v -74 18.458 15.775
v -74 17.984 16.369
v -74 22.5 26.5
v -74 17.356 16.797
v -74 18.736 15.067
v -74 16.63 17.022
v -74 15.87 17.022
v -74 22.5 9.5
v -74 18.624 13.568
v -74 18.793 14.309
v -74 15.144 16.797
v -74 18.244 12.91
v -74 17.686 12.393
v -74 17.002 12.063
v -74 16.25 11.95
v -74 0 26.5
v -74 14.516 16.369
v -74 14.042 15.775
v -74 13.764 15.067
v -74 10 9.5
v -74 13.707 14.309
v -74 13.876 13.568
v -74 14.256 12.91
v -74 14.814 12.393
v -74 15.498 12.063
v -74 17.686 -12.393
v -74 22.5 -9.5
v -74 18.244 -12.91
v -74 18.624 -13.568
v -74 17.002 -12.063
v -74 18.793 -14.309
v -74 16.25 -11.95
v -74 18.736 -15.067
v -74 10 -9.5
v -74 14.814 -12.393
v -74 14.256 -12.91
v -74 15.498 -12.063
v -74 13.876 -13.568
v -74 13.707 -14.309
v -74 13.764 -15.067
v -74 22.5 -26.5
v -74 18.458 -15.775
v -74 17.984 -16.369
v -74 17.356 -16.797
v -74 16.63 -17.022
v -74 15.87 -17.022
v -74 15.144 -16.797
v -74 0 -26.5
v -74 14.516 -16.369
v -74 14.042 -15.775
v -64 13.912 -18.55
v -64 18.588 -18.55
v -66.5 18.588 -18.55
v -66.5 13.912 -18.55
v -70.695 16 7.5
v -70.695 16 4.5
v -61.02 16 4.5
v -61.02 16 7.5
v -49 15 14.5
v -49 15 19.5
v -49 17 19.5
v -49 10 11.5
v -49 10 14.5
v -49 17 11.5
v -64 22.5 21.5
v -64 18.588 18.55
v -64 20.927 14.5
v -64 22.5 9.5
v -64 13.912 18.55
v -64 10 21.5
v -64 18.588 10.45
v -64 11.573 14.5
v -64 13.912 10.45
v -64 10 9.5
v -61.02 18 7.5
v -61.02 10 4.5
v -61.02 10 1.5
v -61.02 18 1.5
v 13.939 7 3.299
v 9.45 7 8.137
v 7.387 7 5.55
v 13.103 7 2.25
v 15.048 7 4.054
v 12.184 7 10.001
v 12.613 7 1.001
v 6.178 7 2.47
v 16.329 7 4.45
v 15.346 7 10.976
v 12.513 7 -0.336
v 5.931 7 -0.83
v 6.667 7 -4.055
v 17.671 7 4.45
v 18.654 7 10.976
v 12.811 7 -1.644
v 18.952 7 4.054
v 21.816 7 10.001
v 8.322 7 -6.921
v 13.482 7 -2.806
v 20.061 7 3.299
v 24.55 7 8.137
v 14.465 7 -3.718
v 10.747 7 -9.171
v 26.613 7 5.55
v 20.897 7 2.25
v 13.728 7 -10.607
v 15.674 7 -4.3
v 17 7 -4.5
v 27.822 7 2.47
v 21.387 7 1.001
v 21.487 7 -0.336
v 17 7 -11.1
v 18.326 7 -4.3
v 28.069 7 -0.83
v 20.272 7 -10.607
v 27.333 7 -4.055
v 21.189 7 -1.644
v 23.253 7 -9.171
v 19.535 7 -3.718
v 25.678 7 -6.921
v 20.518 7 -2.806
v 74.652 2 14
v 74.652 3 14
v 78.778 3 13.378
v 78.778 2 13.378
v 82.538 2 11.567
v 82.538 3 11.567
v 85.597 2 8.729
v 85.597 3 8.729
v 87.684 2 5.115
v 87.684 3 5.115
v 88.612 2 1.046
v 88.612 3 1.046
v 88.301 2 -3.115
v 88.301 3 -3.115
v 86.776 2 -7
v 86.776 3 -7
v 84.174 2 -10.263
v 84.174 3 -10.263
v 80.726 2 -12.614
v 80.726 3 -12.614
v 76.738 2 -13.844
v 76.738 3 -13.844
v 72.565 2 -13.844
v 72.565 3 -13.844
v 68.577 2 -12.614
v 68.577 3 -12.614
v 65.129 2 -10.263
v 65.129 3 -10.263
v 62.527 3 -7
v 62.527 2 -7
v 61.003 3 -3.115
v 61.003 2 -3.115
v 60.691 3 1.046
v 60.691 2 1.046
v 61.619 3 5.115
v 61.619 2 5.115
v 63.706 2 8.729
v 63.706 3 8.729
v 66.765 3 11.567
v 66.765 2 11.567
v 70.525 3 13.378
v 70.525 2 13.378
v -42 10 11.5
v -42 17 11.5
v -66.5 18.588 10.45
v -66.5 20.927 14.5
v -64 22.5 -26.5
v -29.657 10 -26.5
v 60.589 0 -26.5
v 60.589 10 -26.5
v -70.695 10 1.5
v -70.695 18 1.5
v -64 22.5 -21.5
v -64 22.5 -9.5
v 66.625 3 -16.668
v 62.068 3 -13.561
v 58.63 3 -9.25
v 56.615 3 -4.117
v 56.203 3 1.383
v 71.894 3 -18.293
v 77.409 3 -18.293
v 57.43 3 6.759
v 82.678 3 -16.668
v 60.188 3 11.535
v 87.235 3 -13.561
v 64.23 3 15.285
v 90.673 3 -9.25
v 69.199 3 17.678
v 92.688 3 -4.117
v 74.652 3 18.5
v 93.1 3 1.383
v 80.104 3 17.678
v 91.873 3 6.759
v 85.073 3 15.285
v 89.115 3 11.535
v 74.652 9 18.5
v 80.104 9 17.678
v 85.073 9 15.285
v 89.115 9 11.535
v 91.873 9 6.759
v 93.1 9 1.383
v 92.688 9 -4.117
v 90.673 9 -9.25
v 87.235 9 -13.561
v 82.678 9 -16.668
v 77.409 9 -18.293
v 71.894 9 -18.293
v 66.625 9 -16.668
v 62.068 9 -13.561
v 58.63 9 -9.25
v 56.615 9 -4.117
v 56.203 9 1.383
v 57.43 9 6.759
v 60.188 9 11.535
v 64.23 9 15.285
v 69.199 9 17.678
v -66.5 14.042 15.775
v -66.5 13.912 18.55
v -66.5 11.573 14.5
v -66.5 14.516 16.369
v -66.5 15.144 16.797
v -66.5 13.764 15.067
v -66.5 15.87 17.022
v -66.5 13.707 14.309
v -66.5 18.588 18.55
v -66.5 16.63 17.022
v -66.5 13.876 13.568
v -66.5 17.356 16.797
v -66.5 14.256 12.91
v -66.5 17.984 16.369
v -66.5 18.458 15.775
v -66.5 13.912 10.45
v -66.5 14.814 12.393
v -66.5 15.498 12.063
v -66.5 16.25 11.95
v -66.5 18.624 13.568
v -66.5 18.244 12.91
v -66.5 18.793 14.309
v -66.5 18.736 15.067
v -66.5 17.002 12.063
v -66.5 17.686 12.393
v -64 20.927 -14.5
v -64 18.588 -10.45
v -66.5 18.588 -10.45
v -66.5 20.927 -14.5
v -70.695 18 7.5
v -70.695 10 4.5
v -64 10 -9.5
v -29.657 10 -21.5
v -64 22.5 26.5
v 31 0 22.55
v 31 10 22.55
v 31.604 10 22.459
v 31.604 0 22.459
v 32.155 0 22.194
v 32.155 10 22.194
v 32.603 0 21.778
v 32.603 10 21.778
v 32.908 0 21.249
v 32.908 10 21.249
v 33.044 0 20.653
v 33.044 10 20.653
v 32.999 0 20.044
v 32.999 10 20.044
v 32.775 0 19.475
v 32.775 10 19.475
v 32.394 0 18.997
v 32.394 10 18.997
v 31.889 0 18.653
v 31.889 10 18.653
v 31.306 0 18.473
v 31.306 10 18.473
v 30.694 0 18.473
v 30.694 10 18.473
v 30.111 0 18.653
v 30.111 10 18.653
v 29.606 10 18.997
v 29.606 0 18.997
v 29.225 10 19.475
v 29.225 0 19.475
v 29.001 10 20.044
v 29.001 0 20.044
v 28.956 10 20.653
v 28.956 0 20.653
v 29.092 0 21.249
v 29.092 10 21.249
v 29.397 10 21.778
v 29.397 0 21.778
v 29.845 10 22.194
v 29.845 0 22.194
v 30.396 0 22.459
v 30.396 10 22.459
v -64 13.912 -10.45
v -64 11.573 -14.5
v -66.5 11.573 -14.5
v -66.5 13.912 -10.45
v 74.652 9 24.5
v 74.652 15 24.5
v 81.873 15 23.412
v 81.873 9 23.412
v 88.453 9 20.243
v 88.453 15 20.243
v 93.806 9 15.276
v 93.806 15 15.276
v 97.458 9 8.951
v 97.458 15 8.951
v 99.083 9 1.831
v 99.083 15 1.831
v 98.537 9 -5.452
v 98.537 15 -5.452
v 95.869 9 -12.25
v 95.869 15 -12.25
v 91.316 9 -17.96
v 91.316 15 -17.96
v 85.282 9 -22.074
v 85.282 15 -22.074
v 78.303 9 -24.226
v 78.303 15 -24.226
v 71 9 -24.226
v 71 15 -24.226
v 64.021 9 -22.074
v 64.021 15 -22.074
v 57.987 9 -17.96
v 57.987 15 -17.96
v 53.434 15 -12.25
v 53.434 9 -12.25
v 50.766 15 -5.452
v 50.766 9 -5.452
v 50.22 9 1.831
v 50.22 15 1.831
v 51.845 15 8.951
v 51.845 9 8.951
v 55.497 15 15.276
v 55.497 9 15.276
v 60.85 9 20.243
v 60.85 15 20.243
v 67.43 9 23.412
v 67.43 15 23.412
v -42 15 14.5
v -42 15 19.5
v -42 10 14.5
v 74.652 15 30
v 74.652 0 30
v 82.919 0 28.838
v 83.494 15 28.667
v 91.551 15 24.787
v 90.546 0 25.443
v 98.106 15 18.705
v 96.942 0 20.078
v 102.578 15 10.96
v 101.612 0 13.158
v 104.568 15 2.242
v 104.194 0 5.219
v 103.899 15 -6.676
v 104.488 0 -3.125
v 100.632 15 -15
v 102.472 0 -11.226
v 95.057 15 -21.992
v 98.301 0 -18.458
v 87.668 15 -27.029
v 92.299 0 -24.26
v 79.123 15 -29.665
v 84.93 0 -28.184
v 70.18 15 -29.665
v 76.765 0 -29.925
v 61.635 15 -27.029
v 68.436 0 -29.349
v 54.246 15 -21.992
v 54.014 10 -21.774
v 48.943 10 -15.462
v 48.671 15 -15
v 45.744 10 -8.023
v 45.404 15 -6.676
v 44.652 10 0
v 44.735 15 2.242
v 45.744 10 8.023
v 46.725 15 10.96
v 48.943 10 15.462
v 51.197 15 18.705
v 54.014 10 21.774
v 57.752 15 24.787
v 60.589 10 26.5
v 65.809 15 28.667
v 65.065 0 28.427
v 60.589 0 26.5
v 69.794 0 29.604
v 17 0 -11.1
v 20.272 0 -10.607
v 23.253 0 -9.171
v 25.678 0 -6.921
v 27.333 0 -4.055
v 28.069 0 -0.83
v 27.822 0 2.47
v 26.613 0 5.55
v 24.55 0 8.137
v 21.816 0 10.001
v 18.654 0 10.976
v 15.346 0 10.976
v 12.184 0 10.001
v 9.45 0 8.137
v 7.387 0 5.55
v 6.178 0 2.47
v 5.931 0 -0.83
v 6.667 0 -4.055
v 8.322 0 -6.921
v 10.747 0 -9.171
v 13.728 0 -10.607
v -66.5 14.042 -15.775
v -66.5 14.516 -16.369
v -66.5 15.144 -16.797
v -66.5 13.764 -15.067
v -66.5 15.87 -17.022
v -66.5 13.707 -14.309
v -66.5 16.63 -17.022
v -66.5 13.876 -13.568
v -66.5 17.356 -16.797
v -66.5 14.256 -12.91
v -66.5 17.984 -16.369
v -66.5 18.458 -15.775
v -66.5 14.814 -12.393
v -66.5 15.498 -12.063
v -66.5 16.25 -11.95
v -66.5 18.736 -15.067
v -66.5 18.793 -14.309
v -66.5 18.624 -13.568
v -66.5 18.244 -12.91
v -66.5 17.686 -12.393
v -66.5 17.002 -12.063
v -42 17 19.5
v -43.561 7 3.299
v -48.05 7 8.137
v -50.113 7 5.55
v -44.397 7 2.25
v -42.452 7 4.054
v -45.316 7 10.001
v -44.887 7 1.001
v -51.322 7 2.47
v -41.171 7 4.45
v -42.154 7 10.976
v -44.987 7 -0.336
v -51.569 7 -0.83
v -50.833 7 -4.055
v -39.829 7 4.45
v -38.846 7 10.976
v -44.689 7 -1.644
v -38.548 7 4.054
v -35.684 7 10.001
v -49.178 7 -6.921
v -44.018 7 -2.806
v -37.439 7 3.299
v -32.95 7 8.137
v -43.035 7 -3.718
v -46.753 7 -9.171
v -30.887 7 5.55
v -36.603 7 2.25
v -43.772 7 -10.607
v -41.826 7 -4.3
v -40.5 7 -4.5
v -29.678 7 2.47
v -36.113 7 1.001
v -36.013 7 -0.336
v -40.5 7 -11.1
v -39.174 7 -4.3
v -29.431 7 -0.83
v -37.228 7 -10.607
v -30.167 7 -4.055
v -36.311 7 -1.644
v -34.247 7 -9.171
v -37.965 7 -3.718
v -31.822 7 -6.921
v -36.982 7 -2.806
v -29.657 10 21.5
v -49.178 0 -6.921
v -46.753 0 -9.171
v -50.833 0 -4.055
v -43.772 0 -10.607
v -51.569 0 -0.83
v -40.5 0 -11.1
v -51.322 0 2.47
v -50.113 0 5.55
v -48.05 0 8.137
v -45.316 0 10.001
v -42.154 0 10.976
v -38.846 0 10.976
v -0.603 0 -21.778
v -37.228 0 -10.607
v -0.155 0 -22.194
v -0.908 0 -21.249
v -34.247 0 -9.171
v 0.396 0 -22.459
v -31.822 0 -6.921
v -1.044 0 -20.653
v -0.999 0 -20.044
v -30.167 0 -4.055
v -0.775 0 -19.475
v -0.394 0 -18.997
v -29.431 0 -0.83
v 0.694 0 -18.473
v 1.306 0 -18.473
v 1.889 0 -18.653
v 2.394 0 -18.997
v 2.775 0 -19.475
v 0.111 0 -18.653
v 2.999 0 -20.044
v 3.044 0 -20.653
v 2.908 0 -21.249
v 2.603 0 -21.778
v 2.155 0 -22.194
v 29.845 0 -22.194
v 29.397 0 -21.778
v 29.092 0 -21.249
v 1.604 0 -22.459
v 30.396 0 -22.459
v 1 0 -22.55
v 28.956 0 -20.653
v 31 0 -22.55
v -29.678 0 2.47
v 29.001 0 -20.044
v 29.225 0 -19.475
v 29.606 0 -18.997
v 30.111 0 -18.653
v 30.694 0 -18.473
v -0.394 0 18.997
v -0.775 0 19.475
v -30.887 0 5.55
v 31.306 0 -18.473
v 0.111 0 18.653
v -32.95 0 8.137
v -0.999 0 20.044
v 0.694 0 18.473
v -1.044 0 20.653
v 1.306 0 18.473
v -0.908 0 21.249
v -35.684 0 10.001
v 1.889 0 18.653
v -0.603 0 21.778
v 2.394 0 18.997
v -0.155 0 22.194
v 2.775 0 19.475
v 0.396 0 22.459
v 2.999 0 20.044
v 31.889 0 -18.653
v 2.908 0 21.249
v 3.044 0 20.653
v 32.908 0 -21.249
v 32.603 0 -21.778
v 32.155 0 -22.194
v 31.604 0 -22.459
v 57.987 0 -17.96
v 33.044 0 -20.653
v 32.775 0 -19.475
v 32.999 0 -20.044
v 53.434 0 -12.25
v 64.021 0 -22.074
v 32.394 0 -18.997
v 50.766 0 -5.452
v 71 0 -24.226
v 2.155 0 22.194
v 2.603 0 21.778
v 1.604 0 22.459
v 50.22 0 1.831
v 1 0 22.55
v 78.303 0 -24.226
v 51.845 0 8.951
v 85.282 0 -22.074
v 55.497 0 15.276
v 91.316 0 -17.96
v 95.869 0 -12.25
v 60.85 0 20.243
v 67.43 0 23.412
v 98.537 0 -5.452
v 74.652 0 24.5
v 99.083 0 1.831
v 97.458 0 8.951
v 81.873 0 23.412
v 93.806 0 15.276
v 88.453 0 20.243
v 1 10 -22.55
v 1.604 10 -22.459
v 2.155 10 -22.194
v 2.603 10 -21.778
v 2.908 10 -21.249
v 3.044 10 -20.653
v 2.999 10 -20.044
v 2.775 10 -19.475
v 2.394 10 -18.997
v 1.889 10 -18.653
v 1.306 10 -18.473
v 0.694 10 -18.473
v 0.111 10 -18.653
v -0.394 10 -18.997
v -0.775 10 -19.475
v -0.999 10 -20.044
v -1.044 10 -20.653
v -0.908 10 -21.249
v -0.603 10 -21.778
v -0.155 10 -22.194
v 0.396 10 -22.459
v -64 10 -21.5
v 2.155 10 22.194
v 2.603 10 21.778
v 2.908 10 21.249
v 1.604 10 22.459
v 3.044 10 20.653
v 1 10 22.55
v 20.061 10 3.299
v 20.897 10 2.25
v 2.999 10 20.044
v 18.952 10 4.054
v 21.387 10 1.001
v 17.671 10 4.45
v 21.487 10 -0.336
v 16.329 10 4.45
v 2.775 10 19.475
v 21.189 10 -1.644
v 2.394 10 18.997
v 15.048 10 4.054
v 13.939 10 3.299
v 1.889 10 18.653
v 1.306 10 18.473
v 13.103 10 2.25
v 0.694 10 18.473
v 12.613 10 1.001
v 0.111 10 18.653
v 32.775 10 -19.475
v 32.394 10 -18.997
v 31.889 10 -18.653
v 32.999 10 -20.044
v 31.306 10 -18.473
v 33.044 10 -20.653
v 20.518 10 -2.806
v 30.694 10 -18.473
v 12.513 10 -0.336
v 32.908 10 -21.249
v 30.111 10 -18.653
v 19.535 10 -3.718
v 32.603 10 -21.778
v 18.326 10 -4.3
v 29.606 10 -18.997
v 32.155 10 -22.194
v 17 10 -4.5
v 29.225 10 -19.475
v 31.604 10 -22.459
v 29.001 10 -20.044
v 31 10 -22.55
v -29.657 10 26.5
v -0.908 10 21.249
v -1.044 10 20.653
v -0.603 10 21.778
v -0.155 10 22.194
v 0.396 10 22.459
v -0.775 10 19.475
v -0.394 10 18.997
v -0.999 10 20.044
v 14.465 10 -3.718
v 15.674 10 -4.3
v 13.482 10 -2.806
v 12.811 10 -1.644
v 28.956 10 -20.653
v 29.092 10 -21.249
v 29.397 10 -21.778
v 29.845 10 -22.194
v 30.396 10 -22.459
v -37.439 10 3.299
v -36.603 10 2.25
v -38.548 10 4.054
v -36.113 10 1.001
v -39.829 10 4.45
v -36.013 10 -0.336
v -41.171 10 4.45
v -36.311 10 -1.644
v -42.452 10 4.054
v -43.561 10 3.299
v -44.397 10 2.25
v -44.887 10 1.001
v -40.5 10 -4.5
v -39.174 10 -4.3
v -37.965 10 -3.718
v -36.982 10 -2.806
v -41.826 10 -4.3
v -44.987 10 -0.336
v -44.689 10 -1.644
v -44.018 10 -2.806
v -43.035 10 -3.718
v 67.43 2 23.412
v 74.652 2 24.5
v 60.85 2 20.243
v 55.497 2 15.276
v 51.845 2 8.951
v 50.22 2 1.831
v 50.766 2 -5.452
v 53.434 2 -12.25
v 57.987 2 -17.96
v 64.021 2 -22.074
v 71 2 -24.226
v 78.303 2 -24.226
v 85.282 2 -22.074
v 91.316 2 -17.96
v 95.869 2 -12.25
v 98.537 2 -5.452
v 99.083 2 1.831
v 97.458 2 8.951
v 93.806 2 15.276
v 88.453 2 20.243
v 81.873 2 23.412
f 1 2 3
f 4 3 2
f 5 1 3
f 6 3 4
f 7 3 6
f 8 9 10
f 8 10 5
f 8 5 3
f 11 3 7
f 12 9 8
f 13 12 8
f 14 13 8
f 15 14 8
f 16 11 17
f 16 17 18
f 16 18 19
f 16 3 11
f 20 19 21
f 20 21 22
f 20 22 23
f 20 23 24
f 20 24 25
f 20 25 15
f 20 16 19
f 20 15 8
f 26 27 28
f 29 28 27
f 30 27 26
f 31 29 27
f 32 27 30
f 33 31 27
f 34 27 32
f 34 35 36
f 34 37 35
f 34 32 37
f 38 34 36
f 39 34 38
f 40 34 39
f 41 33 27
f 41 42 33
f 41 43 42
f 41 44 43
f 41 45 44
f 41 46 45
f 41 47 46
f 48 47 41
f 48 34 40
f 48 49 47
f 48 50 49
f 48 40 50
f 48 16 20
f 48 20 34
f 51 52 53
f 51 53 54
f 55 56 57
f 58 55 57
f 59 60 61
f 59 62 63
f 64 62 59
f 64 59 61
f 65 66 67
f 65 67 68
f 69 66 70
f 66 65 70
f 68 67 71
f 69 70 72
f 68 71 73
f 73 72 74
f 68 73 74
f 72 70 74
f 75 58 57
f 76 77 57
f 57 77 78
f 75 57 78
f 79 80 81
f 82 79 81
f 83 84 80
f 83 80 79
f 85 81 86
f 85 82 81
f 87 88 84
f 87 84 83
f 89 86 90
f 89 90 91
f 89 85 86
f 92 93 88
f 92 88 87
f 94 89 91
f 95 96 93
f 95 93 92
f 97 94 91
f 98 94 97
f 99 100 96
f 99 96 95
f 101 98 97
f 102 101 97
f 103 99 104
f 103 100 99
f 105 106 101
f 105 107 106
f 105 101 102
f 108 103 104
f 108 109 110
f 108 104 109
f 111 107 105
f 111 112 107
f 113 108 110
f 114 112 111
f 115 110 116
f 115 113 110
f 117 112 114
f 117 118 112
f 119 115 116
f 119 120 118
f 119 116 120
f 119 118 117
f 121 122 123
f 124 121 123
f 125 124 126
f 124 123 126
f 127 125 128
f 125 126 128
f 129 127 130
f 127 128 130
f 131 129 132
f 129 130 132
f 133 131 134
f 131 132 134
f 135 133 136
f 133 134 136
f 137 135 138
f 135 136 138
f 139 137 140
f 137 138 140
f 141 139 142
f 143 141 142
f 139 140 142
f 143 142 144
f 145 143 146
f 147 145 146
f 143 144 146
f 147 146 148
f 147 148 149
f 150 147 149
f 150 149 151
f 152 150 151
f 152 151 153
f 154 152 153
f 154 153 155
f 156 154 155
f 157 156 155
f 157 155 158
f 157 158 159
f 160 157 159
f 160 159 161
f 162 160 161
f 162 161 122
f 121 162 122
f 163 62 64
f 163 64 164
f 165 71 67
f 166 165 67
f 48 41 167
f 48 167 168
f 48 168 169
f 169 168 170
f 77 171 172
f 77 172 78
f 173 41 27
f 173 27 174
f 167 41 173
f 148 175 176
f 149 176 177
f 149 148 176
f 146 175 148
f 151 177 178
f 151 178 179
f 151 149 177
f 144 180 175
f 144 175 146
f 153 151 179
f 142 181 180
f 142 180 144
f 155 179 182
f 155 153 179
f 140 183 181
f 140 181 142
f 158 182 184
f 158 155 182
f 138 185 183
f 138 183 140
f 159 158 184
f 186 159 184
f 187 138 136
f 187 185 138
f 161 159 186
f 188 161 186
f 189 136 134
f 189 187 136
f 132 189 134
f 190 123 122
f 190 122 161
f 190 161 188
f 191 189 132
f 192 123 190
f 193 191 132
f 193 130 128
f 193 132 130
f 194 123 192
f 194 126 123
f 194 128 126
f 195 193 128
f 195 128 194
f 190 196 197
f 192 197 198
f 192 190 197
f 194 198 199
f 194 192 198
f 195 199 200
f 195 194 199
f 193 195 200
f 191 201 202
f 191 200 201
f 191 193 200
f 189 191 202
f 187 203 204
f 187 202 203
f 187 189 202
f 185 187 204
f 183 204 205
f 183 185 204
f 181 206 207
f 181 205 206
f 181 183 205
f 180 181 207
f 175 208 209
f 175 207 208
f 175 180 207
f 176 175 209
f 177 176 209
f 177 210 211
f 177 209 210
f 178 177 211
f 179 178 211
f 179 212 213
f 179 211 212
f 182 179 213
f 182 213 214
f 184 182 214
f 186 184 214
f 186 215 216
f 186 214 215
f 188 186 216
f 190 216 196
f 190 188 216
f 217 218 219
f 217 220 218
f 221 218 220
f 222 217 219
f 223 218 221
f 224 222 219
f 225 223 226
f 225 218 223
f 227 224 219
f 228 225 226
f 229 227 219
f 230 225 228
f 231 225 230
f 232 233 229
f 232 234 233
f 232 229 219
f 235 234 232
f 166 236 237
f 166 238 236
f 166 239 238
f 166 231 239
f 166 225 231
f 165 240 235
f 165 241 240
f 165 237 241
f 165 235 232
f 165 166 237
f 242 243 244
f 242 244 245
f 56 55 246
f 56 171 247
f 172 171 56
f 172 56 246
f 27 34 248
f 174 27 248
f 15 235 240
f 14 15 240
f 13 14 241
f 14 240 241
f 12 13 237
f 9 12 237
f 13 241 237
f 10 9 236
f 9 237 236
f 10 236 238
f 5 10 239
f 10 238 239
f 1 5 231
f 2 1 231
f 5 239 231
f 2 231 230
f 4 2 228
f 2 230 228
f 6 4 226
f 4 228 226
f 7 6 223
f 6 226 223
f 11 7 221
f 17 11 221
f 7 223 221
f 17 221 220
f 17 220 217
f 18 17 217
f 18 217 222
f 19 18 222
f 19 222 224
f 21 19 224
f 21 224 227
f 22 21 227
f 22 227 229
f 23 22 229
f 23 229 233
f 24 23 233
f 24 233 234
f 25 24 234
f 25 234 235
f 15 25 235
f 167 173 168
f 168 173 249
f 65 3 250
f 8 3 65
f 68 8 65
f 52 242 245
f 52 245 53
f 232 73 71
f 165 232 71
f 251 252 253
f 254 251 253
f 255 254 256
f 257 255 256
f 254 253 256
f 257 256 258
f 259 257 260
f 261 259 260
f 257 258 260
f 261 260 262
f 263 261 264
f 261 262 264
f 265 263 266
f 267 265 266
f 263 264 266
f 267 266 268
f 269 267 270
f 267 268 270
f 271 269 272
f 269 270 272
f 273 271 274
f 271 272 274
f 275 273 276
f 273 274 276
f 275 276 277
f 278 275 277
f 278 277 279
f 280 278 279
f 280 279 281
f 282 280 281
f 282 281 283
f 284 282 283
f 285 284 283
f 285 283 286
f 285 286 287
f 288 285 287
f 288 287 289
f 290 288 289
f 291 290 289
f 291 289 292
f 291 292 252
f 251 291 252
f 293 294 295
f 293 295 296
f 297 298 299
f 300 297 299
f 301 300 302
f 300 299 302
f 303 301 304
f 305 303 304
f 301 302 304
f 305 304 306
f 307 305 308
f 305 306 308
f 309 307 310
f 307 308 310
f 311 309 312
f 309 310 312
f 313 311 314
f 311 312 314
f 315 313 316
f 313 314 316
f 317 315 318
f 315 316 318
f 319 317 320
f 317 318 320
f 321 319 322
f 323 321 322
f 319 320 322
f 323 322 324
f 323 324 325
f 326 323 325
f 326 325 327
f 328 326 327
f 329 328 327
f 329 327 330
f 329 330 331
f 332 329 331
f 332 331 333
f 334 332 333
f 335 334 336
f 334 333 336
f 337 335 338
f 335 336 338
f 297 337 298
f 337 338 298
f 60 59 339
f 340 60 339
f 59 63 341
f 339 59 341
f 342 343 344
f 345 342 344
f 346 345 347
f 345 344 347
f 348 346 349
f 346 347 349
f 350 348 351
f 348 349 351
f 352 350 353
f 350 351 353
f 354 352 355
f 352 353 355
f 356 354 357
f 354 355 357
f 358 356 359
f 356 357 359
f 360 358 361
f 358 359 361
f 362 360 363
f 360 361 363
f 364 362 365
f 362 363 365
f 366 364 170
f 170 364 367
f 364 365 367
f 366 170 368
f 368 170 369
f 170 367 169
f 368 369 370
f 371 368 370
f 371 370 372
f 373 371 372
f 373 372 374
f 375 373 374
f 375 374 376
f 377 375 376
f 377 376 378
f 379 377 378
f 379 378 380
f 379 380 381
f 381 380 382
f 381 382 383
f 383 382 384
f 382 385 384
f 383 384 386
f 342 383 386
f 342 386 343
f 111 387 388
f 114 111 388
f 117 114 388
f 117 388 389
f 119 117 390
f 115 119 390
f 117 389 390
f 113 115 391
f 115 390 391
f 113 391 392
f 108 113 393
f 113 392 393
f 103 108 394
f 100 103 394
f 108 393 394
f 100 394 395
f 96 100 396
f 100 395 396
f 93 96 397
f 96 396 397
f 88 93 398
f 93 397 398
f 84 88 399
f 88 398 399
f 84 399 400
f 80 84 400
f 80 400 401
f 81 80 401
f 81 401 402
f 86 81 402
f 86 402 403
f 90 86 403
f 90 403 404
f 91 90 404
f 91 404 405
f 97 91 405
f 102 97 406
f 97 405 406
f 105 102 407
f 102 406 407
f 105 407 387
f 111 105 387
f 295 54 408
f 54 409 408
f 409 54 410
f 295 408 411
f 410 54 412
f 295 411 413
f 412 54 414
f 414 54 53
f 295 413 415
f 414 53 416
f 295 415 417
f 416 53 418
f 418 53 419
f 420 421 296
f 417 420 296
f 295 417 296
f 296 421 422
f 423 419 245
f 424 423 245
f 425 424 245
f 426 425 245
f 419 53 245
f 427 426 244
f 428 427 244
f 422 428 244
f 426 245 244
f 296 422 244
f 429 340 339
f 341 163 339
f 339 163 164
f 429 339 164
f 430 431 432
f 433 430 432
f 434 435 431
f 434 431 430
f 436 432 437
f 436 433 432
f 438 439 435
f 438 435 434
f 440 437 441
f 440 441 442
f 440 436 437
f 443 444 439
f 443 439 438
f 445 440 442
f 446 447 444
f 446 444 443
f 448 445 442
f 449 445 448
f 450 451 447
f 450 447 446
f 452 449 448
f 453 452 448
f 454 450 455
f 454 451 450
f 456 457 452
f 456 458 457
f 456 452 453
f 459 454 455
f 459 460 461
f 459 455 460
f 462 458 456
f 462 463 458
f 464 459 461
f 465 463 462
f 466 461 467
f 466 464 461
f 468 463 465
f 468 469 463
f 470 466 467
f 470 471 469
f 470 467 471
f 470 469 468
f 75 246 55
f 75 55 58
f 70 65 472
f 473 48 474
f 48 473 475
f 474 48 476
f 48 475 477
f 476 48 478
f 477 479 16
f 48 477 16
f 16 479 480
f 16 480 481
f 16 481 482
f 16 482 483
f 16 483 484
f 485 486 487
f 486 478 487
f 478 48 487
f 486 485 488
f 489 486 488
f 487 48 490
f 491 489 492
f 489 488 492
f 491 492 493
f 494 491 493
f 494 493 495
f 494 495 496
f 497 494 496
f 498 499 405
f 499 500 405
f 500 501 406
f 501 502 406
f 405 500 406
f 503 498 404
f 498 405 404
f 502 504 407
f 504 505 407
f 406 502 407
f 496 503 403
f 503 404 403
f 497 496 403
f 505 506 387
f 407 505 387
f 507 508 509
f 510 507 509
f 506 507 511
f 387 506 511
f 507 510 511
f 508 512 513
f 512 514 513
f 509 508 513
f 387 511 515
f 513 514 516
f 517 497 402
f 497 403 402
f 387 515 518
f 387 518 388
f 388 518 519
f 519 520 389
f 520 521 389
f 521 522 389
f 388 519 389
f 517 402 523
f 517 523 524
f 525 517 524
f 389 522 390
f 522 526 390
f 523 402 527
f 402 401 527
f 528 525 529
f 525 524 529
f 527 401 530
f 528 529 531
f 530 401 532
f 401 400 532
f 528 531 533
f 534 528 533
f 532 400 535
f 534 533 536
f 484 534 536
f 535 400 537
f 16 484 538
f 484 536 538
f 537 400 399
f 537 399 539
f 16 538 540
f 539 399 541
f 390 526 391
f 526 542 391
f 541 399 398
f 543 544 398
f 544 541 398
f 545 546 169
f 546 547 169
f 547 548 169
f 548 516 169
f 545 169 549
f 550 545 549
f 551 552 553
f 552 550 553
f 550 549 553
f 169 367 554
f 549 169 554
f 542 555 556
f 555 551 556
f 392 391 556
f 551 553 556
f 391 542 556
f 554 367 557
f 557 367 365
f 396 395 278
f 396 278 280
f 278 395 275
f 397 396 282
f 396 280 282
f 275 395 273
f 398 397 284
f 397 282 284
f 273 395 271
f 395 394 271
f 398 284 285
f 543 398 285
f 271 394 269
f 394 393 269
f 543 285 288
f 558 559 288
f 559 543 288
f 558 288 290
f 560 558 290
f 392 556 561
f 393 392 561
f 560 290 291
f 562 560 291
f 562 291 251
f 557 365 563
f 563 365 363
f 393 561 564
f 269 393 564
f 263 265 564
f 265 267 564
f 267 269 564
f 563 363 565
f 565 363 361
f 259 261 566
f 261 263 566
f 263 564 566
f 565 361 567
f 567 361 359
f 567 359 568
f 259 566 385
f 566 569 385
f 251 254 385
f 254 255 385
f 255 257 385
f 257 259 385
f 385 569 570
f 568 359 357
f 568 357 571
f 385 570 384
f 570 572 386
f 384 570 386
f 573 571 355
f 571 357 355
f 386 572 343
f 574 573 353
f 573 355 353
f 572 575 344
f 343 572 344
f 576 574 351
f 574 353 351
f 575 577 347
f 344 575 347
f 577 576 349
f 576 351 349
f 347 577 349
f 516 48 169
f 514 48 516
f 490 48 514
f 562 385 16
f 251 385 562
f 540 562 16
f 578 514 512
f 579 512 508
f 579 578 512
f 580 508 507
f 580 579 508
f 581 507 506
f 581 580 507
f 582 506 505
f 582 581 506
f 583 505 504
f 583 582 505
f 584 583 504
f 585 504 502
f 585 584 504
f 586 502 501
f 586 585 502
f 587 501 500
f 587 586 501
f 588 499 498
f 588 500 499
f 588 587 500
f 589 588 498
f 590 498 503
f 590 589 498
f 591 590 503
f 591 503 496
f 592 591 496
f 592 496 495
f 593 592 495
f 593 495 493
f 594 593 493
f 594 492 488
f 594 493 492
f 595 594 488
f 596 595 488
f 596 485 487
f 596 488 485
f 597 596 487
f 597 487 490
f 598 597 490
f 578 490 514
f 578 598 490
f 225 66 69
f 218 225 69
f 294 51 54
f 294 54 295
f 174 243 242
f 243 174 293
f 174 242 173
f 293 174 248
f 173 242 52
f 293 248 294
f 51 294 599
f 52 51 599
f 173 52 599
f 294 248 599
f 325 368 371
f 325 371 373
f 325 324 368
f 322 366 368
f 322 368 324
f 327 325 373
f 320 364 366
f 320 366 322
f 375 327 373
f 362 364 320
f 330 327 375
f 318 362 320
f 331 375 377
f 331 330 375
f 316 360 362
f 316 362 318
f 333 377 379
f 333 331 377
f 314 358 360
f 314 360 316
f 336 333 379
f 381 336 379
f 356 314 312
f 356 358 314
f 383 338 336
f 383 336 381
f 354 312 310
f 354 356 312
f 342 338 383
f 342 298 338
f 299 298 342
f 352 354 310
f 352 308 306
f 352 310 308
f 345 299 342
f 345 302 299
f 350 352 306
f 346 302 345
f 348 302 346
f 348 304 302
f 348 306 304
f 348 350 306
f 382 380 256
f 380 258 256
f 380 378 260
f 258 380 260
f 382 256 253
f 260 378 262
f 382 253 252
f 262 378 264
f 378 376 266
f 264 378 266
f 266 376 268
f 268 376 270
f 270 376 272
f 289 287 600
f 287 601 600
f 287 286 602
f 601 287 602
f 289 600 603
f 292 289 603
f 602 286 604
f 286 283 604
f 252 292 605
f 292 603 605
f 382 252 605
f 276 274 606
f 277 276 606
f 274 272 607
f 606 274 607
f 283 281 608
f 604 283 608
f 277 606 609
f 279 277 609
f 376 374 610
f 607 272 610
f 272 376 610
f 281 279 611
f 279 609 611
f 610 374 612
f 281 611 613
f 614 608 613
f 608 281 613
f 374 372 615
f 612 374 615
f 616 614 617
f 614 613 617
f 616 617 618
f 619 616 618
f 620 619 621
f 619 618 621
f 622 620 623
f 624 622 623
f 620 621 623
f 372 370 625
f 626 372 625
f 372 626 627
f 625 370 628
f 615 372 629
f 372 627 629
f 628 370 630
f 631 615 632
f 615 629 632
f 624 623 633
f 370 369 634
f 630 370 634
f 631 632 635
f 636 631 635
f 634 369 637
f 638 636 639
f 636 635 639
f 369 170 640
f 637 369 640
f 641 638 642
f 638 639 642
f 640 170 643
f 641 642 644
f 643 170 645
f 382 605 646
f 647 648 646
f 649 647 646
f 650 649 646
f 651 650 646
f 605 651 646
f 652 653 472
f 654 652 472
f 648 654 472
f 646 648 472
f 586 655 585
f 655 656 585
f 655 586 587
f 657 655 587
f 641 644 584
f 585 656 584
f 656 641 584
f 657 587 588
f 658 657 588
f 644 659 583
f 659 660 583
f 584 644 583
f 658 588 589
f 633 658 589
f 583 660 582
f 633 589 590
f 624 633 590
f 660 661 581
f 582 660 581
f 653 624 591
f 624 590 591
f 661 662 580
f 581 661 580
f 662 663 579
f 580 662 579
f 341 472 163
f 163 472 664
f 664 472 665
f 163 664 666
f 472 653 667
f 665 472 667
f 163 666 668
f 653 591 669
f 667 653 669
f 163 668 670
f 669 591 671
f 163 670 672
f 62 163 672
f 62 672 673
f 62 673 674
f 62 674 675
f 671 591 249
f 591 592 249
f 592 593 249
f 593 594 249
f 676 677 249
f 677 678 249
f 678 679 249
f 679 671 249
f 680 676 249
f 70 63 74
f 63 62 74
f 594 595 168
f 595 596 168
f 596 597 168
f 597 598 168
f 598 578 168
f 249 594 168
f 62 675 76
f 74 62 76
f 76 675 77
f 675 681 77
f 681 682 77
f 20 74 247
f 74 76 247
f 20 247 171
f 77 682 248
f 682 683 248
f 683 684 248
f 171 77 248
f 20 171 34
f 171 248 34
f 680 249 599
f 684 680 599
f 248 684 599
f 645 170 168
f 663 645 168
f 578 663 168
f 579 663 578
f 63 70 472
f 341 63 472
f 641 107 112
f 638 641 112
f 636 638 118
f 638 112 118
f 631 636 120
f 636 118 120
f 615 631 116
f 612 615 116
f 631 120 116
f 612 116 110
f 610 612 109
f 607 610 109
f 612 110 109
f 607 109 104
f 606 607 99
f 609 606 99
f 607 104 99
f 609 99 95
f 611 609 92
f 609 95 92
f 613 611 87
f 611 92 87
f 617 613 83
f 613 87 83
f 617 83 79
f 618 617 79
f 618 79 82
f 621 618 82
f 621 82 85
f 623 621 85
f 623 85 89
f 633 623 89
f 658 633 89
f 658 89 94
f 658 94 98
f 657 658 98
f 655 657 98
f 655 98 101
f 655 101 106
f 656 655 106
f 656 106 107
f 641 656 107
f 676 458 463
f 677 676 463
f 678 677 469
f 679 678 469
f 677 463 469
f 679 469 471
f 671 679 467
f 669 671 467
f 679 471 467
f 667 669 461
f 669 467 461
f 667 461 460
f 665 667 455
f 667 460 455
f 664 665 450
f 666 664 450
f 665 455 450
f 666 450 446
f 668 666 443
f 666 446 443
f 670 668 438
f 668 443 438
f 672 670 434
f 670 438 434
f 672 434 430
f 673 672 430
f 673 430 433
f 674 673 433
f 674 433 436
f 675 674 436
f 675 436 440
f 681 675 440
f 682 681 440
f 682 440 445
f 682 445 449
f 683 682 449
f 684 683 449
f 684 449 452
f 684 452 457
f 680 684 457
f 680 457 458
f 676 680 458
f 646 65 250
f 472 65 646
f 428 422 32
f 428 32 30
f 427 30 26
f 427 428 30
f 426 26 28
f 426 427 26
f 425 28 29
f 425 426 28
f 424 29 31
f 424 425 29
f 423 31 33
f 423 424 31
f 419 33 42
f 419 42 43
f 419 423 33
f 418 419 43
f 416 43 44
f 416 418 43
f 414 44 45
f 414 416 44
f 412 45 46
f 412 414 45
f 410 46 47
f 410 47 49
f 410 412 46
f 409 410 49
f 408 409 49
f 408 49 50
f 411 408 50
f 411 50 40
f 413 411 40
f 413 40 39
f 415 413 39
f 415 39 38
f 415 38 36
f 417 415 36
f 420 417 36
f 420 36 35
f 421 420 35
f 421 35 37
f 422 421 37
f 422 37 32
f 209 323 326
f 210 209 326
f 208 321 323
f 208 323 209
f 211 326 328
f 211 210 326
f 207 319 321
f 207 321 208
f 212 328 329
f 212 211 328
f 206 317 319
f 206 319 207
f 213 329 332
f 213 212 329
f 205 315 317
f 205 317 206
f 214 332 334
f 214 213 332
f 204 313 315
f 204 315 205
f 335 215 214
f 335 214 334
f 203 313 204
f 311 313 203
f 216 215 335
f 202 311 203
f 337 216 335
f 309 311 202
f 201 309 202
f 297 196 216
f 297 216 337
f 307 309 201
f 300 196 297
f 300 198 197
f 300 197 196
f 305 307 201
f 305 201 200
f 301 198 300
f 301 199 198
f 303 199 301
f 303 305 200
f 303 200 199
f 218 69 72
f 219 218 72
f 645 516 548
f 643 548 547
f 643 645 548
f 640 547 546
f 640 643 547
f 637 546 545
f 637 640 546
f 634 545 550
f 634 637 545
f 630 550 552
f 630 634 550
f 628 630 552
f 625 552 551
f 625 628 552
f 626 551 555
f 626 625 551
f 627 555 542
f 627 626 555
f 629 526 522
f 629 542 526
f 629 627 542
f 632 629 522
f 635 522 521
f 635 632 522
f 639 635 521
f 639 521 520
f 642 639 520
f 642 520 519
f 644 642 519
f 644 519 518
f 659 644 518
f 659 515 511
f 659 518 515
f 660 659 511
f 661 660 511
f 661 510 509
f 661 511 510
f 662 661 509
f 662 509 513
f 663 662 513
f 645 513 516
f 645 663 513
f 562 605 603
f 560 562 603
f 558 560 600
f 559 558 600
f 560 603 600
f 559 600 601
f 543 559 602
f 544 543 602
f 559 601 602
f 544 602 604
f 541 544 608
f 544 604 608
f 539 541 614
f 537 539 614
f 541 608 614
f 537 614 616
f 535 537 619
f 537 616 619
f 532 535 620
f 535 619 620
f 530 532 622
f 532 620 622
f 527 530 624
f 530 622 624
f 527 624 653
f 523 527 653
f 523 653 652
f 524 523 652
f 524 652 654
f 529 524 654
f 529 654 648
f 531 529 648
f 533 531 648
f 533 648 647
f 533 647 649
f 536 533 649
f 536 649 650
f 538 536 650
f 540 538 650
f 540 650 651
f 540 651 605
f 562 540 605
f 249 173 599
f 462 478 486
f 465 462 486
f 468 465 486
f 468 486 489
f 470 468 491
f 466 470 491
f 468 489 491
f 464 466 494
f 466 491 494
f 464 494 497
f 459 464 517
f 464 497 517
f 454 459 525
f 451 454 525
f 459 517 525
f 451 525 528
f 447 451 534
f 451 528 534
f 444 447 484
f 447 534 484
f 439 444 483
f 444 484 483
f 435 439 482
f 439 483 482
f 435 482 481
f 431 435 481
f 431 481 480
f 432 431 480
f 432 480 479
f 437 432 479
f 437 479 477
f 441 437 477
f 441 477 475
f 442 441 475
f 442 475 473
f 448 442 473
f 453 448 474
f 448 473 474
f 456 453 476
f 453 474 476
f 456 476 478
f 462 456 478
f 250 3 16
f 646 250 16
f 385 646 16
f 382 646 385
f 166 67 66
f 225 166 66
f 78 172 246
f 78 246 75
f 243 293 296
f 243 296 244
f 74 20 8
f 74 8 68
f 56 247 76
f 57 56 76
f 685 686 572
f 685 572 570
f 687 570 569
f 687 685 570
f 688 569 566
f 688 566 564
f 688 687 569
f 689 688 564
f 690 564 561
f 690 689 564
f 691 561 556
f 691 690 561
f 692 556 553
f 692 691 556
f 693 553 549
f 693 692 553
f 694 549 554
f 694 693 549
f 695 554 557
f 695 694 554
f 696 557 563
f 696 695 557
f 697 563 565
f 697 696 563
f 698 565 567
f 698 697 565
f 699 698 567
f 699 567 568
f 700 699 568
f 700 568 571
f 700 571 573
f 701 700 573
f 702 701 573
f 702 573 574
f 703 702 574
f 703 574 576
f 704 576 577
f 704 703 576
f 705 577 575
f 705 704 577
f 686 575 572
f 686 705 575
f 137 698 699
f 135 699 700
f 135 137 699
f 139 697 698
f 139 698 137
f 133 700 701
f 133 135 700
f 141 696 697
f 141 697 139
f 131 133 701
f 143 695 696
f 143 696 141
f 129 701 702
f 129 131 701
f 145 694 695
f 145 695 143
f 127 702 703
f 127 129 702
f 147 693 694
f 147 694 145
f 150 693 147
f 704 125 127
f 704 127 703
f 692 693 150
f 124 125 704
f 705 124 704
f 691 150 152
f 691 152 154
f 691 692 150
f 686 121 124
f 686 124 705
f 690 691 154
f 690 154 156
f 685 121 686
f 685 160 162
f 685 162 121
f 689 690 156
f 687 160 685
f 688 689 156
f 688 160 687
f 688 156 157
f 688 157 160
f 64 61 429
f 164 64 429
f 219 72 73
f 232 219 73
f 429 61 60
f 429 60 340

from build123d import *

# Parameters (mm, degrees)
BOSS_EXTRUDE1_DEPTH      = 10
SKETCH3_W                = 10
SKETCH3_H                = 17
BOSS_EXTRUDE2_DEPTH      = 12.5
RIB1_REACH               = 118.391
SKETCH4_WALL_W           = 271.329674284
SKETCH4_WALL_H           = 5
CUT_EXTRUDE1_REACH       = 170.771
SKETCH6_R                = 2.55
CUT_EXTRUDE2_DEPTH       = 2.5
BOSS_EXTRUDE4_DEPTH      = 5
BOSS_EXTRUDE4_DEPTH_BACK = 10
SKETCH11_R               = 30
CUT_EXTRUDE3_REACH       = 111.582
SKETCH8_R                = 14
CUT_EXTRUDE4_DEPTH       = 6
CUT_EXTRUDE4_DEPTH_BACK  = 7
SKETCH9_R                = 18.5
SKETCH12_R               = 24.5
CUT_EXTRUDE6_DEPTH       = 6
SKETCH13_R               = 2.05
CUT_EXTRUDE7_DEPTH       = 110.581884276
CUT_EXTRUDE9_START       = -2
SKETCH15_R               = 24.5
CUT_EXTRUDE9_DEPTH       = 2
SKETCH17_R               = 11.1
CUT_EXTRUDE11_DEPTH      = 7
CUT_EXTRUDE12_REACH      = 111.964
SKETCH18_R               = 4.5
SKETCH19_R               = 11.1
CUT_EXTRUDE13_DEPTH      = 7
CUT_EXTRUDE14_REACH      = 111.964
SKETCH20_R               = 4.5
SKETCH21_W               = 7
SKETCH21_H               = 3
BOSS_EXTRUDE5_DEPTH      = 7
SKETCH22_W               = 7
SKETCH22_H               = 2
BOSS_EXTRUDE6_DEPTH      = 5
SKETCH23_W               = 9.67527482
SKETCH23_H               = 3
BOSS_EXTRUDE7_DEPTH      = 8
SKETCH24_W               = 9.67527482
SKETCH24_H               = 2
BOSS_EXTRUDE8_DEPTH      = 3


with BuildPart() as part:
    # Sketch2 → Boss-Extrude1 (new body)
    with BuildSketch(Plane(origin=(0, 0, 0), x_dir=(1, 0, 0), z_dir=(0, 1, 0))):
        with BuildLine():
            Line((-74, 26.5), (74.6515139, 26.5))
            ThreePointArc((74.6515139, 26.5), (101.1515139, 0), (74.6515139, -26.5))
            Line((74.6515139, -26.5), (-74, -26.5))
            Line((-74, -26.5), (-74, 26.5))
        make_face()
    extrude(amount=BOSS_EXTRUDE1_DEPTH)

    # Sketch3 → Boss-Extrude2 (add)
    with BuildSketch(Plane(origin=(0, 10, 0), x_dir=(1, 0, 0), z_dir=(0, 1, 0))):
        with Locations((-69, -18)):
            Rectangle(SKETCH3_W, SKETCH3_H)
        with Locations((-69, 18)):
            Rectangle(SKETCH3_W, SKETCH3_H)
    extrude(amount=BOSS_EXTRUDE2_DEPTH)

    # Sketch4 wall → Rib1 (add, up to next)
    with BuildSketch(Plane(origin=(-46.828266128, 16.25, 26.5), x_dir=(0.939692620785, -0.342020143327, 0), z_dir=(0.342020143327, 0.939692620785, 0)), mode=Mode.PRIVATE) as rib1_sk1:
        with Locations((0, 2.5)):
            Rectangle(SKETCH4_WALL_W, SKETCH4_WALL_H)
    rib1_tool1 = extrude(rib1_sk1.sketch, amount=-RIB1_REACH, mode=Mode.PRIVATE) - part.part
    rib1 = rib1_tool1.solids().sort_by_distance((-46.828266128, 16.25, 26.5))[0]
    add(rib1)

    # Mirror1: Rib1 across plane
    add(rib1.mirror(Plane.XY))

    # Sketch6 → Cut-Extrude1 (cut, up to next)
    with BuildSketch(Plane(origin=(-64, 0, 0), x_dir=(0, 0, -1), z_dir=(1, 0, 0)), mode=Mode.PRIVATE) as cut_extrude1_sk1:
        with Locations((-14.5, 16.25)):
            Circle(SKETCH6_R)
    cut_extrude1_tool1 = extrude(cut_extrude1_sk1.sketch, amount=-CUT_EXTRUDE1_REACH, mode=Mode.PRIVATE) & part.part
    cut_extrude1 = cut_extrude1_tool1.solids().sort_by_distance((-64, 16.25, 14.5))[0]
    add(cut_extrude1, mode=Mode.SUBTRACT)

    # Sketch7 → Cut-Extrude2 (cut)
    with BuildSketch(Plane(origin=(-64, 0, 0), x_dir=(0, 0, -1), z_dir=(1, 0, 0))):
        Polygon((-10.45, 13.91173141), (-10.45, 18.58826859), (-14.5, 20.92653718), (-18.55, 18.58826859), (-18.55, 13.91173141), (-14.5, 11.57346282), align=None)
    cut_extrude2 = extrude(amount=-CUT_EXTRUDE2_DEPTH, mode=Mode.SUBTRACT)

    # Mirror2: Cut-Extrude1, Cut-Extrude2 across plane
    add(cut_extrude1.mirror(Plane.XY), mode=Mode.SUBTRACT)
    add(cut_extrude2.mirror(Plane.XY), mode=Mode.SUBTRACT)

    # Sketch11 → Boss-Extrude4 (add, two sides: drawn at the far end of the back side and taken through both)
    with BuildSketch(Plane(origin=(0, 10, 0), x_dir=(1, 0, 0), z_dir=(0, 1, 0)).offset(-BOSS_EXTRUDE4_DEPTH_BACK)):
        with Locations(Location((74.6515139, 0, 0), (0, 0, 270))):
            Circle(SKETCH11_R)
    extrude(amount=BOSS_EXTRUDE4_DEPTH + BOSS_EXTRUDE4_DEPTH_BACK)

    # Sketch8 → Cut-Extrude3 (cut, up to next)
    with BuildSketch(Plane(origin=(0, 10, 0), x_dir=(1, 0, 0), z_dir=(0, 1, 0)), mode=Mode.PRIVATE) as cut_extrude3_sk1:
        with Locations(Location((74.6515139, 0, 0), (0, 0, 270))):
            Circle(SKETCH8_R)
    cut_extrude3_tool1 = extrude(cut_extrude3_sk1.sketch, amount=-CUT_EXTRUDE3_REACH, mode=Mode.PRIVATE) & part.part
    add(cut_extrude3_tool1.solids().sort_by_distance((74.651514, 10, 0))[0], mode=Mode.SUBTRACT)

    # Sketch9 → Cut-Extrude4 (cut, two sides: drawn at the far end of the back side and taken through both)
    with BuildSketch(Plane(origin=(0, 10, 0), x_dir=(1, 0, 0), z_dir=(0, 1, 0)).offset(-CUT_EXTRUDE4_DEPTH_BACK)):
        with Locations(Location((74.6515139, 0, 0), (0, 0, 270))):
            Circle(SKETCH9_R)
    extrude(amount=CUT_EXTRUDE4_DEPTH + CUT_EXTRUDE4_DEPTH_BACK, mode=Mode.SUBTRACT)

    # Sketch12 → Cut-Extrude6 (cut)
    with BuildSketch(Plane(origin=(0, 15, 0), x_dir=(1, 0, 0), z_dir=(0, 1, 0))):
        with Locations(Location((74.6515139, 0, 0), (0, 0, 270))):
            Circle(SKETCH12_R)
    extrude(amount=-CUT_EXTRUDE6_DEPTH, mode=Mode.SUBTRACT)

    # Sketch13 → Cut-Extrude7 (cut, through all)
    with BuildSketch(Plane(origin=(0, 10, 0), x_dir=(1, 0, 0), z_dir=(0, 1, 0))):
        with Locations(Location((1, -20.5, 0), (0, 0, 270))):
            Circle(SKETCH13_R)
        with Locations(Location((31, -20.5, 0), (0, 0, 270))):
            Circle(SKETCH13_R)
    cut_extrude7 = extrude(amount=-CUT_EXTRUDE7_DEPTH, mode=Mode.SUBTRACT)

    # Sketch15 → Cut-Extrude9 (cut)
    with BuildSketch(Plane.XZ.offset(CUT_EXTRUDE9_START)):
        with Locations(Location((74.6515139, 0, 0), (0, 0, 90))):
            Circle(SKETCH15_R)
    extrude(amount=CUT_EXTRUDE9_DEPTH, mode=Mode.SUBTRACT)

    # Sketch17 → Cut-Extrude11 (cut)
    with BuildSketch(Plane.XZ):
        with Locations(Location((-40.5, 0, 0), (0, 0, 270))):
            Circle(SKETCH17_R)
    extrude(amount=-CUT_EXTRUDE11_DEPTH, mode=Mode.SUBTRACT)

    # Sketch18 → Cut-Extrude12 (cut, up to next)
    with BuildSketch(Plane.XZ.offset(-7), mode=Mode.PRIVATE) as cut_extrude12_sk1:
        with Locations(Location((-40.5, 0, 0), (0, 0, 270))):
            Circle(SKETCH18_R)
    cut_extrude12_tool1 = extrude(cut_extrude12_sk1.sketch, amount=-CUT_EXTRUDE12_REACH, mode=Mode.PRIVATE) & part.part
    add(cut_extrude12_tool1.solids().sort_by_distance((-40.5, 7, 0))[0], mode=Mode.SUBTRACT)

    # Sketch19 → Cut-Extrude13 (cut)
    with BuildSketch(Plane.XZ):
        with Locations(Location((17, 0, 0), (0, 0, 270))):
            Circle(SKETCH19_R)
    extrude(amount=-CUT_EXTRUDE13_DEPTH, mode=Mode.SUBTRACT)

    # Sketch20 → Cut-Extrude14 (cut, up to next)
    with BuildSketch(Plane.XZ.offset(-7), mode=Mode.PRIVATE) as cut_extrude14_sk1:
        with Locations(Location((17, 0, 0), (0, 0, 270))):
            Circle(SKETCH20_R)
    cut_extrude14_tool1 = extrude(cut_extrude14_sk1.sketch, amount=-CUT_EXTRUDE14_REACH, mode=Mode.PRIVATE) & part.part
    add(cut_extrude14_tool1.solids().sort_by_distance((17, 7, 0))[0], mode=Mode.SUBTRACT)

    # Mirror3: Cut-Extrude7 across plane
    add(cut_extrude7.mirror(Plane.XY), mode=Mode.SUBTRACT)

    # Sketch21 → Boss-Extrude5 (add)
    with BuildSketch(Plane(origin=(0, 10, 0), x_dir=(1, 0, 0), z_dir=(0, 1, 0))):
        with Locations((-45.5, -13)):
            Rectangle(SKETCH21_W, SKETCH21_H)
    extrude(amount=BOSS_EXTRUDE5_DEPTH)

    # Sketch22 → Boss-Extrude6 (add)
    with BuildSketch(Plane.XY.offset(14.5)):
        with Locations((-45.5, 16)):
            Rectangle(SKETCH22_W, SKETCH22_H)
    extrude(amount=BOSS_EXTRUDE6_DEPTH)

    # Sketch23 → Boss-Extrude7 (add)
    with BuildSketch(Plane(origin=(0, 10, 0), x_dir=(1, 0, 0), z_dir=(0, 1, 0))):
        with Locations((-65.857730682, -3)):
            Rectangle(SKETCH23_W, SKETCH23_H)
    extrude(amount=BOSS_EXTRUDE7_DEPTH)

    # Sketch24 → Boss-Extrude8 (add)
    with BuildSketch(Plane.XY.offset(4.5)):
        with Locations((-65.857730682, 17)):
            Rectangle(SKETCH24_W, SKETCH24_H)
    extrude(amount=BOSS_EXTRUDE8_DEPTH)


solid = part.part
